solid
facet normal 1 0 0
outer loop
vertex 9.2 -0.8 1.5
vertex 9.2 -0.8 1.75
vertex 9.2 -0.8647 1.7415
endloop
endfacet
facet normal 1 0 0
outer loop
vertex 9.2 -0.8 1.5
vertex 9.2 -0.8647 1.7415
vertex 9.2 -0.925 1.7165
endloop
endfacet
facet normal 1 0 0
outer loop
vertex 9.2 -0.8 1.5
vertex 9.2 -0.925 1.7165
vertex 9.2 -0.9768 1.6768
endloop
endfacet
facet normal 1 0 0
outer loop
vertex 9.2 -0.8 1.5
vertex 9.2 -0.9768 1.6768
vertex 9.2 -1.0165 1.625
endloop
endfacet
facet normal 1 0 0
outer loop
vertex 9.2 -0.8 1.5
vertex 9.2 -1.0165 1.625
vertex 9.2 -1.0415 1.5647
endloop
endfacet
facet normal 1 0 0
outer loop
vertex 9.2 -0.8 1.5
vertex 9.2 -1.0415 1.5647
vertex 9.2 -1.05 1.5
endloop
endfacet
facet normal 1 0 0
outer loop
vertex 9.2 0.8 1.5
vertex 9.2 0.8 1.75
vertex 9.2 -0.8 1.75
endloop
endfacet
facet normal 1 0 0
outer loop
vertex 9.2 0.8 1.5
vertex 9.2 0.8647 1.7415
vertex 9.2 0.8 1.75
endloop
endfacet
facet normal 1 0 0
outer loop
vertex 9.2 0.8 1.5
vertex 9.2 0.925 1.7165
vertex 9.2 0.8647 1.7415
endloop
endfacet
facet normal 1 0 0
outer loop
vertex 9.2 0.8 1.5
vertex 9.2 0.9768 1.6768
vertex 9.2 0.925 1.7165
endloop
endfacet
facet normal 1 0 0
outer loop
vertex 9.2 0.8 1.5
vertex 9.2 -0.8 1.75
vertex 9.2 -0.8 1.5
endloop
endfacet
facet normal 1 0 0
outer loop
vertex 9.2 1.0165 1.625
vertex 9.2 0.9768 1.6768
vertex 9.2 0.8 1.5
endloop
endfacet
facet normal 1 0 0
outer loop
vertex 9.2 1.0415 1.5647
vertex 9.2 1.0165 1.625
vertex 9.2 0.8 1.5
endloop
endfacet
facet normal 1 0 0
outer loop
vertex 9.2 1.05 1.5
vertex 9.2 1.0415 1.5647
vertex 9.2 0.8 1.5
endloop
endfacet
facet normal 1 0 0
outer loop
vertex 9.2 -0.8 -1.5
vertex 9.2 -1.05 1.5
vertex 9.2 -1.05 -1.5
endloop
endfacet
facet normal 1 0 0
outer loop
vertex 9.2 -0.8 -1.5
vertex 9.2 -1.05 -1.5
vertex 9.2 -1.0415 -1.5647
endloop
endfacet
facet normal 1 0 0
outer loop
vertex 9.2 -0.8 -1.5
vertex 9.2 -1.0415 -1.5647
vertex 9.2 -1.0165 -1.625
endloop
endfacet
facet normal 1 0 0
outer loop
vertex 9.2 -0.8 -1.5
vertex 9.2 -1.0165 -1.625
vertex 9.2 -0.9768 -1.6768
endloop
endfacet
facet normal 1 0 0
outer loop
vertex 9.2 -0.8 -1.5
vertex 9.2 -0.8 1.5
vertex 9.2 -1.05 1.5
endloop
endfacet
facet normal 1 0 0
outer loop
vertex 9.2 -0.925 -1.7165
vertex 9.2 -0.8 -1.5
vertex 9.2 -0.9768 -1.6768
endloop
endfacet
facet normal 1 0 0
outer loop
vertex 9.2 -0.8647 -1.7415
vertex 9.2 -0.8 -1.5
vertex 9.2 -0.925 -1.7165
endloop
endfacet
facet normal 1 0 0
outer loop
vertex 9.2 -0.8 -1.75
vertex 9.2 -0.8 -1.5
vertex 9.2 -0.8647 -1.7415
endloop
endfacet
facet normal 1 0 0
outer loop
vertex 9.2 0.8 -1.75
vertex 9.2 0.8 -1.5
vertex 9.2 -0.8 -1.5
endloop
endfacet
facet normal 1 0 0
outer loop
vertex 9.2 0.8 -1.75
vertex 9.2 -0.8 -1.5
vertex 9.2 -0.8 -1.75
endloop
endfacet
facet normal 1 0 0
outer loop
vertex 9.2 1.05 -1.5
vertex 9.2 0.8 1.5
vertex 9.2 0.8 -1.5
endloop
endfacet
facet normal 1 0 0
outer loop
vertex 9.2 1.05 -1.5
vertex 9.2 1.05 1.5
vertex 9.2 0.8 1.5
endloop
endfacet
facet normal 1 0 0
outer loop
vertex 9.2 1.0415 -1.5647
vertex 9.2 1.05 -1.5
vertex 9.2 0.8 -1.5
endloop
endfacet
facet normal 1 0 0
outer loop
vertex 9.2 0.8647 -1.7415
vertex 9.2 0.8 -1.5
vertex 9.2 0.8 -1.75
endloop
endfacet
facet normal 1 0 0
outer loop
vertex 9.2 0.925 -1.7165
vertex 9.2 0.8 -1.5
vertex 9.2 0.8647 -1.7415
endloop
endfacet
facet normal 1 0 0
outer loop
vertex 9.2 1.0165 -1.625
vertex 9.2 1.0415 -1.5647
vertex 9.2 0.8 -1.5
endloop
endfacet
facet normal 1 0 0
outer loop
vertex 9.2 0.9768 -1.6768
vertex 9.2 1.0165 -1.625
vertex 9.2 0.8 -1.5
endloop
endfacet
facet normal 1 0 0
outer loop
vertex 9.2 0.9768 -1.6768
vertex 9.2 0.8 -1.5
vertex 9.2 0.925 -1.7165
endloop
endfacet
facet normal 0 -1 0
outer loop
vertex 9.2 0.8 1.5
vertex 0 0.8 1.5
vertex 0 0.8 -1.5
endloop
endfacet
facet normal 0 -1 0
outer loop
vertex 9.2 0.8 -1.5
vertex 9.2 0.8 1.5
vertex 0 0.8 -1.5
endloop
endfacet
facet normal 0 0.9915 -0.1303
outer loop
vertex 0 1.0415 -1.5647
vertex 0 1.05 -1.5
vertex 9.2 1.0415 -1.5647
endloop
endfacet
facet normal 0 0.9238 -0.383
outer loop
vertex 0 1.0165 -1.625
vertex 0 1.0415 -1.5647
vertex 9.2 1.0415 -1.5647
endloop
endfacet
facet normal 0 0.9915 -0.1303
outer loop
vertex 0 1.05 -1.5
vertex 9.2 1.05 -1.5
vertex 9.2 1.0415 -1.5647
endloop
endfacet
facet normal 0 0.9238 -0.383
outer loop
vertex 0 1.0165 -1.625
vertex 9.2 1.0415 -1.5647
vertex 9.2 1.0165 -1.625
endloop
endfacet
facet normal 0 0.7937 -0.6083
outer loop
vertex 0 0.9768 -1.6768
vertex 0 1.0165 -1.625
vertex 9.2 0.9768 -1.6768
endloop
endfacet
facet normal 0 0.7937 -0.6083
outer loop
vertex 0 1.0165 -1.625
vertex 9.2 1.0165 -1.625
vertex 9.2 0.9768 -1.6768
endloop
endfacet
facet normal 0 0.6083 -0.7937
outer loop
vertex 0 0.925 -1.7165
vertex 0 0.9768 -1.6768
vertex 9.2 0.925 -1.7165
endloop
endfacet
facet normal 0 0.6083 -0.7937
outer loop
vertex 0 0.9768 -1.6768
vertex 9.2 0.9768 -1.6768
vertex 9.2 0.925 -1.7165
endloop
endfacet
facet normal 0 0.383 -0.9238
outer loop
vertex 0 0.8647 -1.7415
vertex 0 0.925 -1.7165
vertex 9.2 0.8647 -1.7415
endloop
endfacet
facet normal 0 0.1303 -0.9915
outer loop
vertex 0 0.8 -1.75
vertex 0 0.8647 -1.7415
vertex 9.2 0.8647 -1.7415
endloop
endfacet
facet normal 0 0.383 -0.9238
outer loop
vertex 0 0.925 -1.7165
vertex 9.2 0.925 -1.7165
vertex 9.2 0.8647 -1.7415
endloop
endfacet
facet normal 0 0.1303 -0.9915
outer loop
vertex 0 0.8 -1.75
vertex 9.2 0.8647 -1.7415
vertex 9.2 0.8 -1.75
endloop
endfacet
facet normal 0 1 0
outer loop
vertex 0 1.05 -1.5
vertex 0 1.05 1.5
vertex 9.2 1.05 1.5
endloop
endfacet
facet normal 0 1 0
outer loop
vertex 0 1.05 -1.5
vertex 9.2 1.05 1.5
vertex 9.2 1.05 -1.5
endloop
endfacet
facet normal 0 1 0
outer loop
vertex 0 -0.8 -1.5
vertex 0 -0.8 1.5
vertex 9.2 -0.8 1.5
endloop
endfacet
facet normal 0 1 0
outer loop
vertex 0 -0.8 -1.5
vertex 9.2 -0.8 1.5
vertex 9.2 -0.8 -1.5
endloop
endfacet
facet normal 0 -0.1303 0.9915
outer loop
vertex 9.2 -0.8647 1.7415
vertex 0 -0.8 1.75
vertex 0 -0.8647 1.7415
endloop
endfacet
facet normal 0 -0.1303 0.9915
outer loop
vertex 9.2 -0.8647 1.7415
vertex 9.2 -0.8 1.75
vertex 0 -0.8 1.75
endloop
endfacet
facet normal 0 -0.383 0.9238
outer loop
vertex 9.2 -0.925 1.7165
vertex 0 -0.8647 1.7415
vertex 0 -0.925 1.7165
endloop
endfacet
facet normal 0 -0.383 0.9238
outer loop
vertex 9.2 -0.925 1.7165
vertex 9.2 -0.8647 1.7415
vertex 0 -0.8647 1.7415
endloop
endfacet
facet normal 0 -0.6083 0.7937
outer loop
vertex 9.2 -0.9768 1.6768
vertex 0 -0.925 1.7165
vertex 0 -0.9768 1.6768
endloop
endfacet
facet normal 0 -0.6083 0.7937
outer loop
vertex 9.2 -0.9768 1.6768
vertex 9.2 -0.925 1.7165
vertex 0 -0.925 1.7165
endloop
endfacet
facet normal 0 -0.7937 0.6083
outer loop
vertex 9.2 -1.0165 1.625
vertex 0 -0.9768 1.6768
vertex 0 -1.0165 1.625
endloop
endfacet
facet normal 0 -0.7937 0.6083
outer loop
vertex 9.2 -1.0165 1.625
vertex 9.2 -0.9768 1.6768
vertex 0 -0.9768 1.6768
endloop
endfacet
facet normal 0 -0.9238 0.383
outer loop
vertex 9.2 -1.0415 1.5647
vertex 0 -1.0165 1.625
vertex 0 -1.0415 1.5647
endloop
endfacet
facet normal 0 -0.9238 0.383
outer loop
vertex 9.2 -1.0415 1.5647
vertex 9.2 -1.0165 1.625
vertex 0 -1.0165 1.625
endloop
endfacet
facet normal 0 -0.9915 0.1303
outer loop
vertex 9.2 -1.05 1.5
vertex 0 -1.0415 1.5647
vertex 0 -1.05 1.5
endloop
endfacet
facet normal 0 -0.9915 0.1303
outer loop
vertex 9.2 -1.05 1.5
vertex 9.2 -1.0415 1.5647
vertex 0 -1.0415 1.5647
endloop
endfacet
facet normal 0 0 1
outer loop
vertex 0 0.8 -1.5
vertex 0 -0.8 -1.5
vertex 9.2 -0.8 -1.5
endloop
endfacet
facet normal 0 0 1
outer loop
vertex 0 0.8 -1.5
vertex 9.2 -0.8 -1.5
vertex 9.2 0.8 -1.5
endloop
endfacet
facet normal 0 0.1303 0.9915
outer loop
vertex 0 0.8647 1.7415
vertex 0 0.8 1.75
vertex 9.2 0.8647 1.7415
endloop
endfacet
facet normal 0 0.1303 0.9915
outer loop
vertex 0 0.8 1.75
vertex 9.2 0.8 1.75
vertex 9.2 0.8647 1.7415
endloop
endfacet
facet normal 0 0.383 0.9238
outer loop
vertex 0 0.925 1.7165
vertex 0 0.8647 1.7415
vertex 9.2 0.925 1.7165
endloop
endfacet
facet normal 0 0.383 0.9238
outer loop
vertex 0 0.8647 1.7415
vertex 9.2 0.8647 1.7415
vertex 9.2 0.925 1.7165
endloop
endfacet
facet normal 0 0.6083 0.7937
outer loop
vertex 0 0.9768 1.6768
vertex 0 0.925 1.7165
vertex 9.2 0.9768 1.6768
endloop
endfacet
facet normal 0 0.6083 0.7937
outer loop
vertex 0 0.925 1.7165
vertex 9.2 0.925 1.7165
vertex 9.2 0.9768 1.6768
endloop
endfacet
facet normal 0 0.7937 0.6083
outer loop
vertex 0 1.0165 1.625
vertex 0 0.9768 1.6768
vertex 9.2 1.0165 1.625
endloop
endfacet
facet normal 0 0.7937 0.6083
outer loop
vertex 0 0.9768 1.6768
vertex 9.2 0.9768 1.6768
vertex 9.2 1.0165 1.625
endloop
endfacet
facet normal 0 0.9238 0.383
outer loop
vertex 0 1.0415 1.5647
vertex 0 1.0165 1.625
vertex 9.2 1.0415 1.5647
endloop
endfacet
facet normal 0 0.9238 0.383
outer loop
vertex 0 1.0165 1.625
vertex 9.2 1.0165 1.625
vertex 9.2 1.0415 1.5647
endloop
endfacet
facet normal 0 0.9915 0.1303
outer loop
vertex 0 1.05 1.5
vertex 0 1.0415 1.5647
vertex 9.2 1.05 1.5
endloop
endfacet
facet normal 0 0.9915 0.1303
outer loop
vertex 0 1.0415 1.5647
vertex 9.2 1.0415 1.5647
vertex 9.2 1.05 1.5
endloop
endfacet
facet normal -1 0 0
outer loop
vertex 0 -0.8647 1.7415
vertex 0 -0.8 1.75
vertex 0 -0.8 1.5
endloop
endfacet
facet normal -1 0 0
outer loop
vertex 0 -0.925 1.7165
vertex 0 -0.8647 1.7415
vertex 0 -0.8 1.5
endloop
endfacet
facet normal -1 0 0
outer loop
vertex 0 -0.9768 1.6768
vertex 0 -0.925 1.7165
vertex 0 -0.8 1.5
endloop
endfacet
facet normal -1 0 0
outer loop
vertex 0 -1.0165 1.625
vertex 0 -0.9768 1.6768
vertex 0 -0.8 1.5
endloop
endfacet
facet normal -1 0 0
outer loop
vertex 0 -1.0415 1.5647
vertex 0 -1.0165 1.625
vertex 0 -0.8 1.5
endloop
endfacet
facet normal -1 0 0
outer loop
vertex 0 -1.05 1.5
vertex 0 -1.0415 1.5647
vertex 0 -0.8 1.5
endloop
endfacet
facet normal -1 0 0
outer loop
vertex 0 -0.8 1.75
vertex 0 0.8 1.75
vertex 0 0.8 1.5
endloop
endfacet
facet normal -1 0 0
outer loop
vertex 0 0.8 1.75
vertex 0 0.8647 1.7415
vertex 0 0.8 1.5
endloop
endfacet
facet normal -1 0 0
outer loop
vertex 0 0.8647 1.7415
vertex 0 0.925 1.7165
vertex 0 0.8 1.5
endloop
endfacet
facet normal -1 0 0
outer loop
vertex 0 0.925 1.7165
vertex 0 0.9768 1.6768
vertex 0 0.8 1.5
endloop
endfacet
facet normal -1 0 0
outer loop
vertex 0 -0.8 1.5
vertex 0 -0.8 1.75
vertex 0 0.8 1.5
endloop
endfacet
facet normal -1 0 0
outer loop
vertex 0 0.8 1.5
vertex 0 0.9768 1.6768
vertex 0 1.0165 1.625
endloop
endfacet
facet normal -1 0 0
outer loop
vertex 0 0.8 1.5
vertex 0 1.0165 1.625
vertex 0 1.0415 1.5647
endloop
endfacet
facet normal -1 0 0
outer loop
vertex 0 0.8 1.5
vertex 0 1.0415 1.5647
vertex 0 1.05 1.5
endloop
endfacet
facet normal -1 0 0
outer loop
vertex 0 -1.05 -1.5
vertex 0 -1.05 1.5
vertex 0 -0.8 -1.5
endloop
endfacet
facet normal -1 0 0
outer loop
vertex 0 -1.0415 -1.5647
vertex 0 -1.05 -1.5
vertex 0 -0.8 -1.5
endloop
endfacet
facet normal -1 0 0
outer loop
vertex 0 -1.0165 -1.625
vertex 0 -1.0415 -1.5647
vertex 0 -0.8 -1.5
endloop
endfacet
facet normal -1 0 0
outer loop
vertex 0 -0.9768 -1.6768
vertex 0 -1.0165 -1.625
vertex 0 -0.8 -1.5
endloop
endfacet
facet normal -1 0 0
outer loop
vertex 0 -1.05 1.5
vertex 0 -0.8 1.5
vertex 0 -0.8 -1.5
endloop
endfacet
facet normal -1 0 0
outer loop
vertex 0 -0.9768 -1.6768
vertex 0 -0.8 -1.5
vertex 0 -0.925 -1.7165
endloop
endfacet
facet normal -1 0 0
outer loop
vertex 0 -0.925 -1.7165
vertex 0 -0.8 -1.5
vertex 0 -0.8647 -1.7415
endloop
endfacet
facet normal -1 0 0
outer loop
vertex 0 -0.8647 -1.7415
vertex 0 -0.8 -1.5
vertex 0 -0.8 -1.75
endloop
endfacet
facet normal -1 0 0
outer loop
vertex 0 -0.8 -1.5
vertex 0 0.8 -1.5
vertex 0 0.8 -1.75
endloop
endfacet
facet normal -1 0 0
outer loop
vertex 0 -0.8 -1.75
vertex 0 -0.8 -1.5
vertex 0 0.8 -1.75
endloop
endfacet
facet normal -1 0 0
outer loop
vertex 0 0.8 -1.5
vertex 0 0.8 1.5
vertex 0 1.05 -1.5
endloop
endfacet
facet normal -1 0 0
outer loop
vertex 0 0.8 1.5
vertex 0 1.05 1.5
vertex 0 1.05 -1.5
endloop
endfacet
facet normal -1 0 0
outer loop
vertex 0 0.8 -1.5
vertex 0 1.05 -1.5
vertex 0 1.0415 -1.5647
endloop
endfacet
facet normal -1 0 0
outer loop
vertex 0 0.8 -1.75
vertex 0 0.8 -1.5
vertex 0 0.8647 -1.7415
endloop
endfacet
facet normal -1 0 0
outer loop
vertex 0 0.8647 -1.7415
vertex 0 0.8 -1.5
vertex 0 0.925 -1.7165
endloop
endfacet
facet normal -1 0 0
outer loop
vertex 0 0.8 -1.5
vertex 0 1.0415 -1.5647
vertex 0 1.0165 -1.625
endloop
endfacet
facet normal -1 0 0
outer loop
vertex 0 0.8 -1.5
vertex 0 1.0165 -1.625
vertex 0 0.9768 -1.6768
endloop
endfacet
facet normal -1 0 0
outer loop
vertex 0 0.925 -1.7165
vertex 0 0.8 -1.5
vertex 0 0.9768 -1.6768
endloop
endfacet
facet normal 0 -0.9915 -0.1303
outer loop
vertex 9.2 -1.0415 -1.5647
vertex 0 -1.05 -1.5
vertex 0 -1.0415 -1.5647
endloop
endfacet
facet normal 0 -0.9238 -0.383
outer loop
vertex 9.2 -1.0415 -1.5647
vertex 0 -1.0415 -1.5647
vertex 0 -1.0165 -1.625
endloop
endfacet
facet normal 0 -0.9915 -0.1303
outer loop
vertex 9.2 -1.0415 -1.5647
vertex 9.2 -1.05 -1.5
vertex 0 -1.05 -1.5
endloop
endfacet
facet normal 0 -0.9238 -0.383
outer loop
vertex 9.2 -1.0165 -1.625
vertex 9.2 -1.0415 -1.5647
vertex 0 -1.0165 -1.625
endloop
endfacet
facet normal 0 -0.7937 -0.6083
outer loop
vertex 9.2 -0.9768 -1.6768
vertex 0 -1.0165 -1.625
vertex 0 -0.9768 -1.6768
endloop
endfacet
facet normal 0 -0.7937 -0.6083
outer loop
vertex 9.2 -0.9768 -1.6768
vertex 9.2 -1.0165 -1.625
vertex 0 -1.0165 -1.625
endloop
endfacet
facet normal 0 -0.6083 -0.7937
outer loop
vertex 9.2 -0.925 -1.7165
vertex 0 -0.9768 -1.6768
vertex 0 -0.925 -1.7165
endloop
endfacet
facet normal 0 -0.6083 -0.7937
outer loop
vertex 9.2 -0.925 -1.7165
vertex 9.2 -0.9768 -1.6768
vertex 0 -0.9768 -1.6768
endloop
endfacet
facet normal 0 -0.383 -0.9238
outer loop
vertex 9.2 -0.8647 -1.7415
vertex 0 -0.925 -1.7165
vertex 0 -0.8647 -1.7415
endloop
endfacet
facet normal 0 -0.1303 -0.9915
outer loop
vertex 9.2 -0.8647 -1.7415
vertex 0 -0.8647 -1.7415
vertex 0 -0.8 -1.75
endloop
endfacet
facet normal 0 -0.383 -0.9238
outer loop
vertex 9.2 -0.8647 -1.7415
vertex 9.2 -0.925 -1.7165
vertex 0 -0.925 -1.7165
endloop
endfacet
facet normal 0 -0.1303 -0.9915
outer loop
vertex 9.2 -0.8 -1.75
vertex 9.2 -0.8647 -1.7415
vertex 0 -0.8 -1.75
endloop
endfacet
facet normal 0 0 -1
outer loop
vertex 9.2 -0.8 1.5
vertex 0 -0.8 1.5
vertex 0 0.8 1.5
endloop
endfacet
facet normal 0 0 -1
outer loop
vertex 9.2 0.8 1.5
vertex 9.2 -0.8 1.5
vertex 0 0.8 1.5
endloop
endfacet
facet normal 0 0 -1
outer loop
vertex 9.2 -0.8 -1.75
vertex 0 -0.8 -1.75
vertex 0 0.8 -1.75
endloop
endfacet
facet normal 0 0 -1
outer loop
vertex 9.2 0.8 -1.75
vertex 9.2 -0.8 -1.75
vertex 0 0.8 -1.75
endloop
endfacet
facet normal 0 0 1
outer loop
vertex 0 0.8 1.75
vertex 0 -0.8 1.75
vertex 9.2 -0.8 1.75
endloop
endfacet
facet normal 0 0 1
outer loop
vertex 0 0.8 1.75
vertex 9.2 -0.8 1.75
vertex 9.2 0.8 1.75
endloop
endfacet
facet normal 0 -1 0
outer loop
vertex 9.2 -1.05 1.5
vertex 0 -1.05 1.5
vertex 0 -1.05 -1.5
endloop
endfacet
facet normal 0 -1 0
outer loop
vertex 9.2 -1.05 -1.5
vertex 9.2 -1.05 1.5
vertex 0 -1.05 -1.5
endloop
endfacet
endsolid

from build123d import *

# Parameters (mm, degrees)
SKETCH_1_W      = 3.5
SKETCH_1_H      = 2.1
SKETCH_1_W_2    = 3
SKETCH_1_H_2    = 1.6
EXTRUDE_1_DEPTH = 9.2
FILLET_1_R      = 0.25


with BuildPart() as part:
    # 草图1 → 凸台-拉伸1 (new body)
    with BuildSketch(Plane(origin=(0, 0, 0), x_dir=(0, 0, -1), z_dir=(1, 0, 0))):
        Rectangle(SKETCH_1_W, SKETCH_1_H)
        Rectangle(SKETCH_1_W_2, SKETCH_1_H_2, mode=Mode.SUBTRACT)
    extrude(amount=EXTRUDE_1_DEPTH)

    # 圆角1
    fillet_1_edges = [part.edges().sort_by_distance(p)[0] for p in [
        (4.6, -1.05, 1.75),
        (4.6, 1.05, 1.75),
        (4.6, 1.05, -1.75),
        (4.6, -1.05, -1.75),
    ]]
    fillet(fillet_1_edges, radius=FILLET_1_R)


solid = part.part
